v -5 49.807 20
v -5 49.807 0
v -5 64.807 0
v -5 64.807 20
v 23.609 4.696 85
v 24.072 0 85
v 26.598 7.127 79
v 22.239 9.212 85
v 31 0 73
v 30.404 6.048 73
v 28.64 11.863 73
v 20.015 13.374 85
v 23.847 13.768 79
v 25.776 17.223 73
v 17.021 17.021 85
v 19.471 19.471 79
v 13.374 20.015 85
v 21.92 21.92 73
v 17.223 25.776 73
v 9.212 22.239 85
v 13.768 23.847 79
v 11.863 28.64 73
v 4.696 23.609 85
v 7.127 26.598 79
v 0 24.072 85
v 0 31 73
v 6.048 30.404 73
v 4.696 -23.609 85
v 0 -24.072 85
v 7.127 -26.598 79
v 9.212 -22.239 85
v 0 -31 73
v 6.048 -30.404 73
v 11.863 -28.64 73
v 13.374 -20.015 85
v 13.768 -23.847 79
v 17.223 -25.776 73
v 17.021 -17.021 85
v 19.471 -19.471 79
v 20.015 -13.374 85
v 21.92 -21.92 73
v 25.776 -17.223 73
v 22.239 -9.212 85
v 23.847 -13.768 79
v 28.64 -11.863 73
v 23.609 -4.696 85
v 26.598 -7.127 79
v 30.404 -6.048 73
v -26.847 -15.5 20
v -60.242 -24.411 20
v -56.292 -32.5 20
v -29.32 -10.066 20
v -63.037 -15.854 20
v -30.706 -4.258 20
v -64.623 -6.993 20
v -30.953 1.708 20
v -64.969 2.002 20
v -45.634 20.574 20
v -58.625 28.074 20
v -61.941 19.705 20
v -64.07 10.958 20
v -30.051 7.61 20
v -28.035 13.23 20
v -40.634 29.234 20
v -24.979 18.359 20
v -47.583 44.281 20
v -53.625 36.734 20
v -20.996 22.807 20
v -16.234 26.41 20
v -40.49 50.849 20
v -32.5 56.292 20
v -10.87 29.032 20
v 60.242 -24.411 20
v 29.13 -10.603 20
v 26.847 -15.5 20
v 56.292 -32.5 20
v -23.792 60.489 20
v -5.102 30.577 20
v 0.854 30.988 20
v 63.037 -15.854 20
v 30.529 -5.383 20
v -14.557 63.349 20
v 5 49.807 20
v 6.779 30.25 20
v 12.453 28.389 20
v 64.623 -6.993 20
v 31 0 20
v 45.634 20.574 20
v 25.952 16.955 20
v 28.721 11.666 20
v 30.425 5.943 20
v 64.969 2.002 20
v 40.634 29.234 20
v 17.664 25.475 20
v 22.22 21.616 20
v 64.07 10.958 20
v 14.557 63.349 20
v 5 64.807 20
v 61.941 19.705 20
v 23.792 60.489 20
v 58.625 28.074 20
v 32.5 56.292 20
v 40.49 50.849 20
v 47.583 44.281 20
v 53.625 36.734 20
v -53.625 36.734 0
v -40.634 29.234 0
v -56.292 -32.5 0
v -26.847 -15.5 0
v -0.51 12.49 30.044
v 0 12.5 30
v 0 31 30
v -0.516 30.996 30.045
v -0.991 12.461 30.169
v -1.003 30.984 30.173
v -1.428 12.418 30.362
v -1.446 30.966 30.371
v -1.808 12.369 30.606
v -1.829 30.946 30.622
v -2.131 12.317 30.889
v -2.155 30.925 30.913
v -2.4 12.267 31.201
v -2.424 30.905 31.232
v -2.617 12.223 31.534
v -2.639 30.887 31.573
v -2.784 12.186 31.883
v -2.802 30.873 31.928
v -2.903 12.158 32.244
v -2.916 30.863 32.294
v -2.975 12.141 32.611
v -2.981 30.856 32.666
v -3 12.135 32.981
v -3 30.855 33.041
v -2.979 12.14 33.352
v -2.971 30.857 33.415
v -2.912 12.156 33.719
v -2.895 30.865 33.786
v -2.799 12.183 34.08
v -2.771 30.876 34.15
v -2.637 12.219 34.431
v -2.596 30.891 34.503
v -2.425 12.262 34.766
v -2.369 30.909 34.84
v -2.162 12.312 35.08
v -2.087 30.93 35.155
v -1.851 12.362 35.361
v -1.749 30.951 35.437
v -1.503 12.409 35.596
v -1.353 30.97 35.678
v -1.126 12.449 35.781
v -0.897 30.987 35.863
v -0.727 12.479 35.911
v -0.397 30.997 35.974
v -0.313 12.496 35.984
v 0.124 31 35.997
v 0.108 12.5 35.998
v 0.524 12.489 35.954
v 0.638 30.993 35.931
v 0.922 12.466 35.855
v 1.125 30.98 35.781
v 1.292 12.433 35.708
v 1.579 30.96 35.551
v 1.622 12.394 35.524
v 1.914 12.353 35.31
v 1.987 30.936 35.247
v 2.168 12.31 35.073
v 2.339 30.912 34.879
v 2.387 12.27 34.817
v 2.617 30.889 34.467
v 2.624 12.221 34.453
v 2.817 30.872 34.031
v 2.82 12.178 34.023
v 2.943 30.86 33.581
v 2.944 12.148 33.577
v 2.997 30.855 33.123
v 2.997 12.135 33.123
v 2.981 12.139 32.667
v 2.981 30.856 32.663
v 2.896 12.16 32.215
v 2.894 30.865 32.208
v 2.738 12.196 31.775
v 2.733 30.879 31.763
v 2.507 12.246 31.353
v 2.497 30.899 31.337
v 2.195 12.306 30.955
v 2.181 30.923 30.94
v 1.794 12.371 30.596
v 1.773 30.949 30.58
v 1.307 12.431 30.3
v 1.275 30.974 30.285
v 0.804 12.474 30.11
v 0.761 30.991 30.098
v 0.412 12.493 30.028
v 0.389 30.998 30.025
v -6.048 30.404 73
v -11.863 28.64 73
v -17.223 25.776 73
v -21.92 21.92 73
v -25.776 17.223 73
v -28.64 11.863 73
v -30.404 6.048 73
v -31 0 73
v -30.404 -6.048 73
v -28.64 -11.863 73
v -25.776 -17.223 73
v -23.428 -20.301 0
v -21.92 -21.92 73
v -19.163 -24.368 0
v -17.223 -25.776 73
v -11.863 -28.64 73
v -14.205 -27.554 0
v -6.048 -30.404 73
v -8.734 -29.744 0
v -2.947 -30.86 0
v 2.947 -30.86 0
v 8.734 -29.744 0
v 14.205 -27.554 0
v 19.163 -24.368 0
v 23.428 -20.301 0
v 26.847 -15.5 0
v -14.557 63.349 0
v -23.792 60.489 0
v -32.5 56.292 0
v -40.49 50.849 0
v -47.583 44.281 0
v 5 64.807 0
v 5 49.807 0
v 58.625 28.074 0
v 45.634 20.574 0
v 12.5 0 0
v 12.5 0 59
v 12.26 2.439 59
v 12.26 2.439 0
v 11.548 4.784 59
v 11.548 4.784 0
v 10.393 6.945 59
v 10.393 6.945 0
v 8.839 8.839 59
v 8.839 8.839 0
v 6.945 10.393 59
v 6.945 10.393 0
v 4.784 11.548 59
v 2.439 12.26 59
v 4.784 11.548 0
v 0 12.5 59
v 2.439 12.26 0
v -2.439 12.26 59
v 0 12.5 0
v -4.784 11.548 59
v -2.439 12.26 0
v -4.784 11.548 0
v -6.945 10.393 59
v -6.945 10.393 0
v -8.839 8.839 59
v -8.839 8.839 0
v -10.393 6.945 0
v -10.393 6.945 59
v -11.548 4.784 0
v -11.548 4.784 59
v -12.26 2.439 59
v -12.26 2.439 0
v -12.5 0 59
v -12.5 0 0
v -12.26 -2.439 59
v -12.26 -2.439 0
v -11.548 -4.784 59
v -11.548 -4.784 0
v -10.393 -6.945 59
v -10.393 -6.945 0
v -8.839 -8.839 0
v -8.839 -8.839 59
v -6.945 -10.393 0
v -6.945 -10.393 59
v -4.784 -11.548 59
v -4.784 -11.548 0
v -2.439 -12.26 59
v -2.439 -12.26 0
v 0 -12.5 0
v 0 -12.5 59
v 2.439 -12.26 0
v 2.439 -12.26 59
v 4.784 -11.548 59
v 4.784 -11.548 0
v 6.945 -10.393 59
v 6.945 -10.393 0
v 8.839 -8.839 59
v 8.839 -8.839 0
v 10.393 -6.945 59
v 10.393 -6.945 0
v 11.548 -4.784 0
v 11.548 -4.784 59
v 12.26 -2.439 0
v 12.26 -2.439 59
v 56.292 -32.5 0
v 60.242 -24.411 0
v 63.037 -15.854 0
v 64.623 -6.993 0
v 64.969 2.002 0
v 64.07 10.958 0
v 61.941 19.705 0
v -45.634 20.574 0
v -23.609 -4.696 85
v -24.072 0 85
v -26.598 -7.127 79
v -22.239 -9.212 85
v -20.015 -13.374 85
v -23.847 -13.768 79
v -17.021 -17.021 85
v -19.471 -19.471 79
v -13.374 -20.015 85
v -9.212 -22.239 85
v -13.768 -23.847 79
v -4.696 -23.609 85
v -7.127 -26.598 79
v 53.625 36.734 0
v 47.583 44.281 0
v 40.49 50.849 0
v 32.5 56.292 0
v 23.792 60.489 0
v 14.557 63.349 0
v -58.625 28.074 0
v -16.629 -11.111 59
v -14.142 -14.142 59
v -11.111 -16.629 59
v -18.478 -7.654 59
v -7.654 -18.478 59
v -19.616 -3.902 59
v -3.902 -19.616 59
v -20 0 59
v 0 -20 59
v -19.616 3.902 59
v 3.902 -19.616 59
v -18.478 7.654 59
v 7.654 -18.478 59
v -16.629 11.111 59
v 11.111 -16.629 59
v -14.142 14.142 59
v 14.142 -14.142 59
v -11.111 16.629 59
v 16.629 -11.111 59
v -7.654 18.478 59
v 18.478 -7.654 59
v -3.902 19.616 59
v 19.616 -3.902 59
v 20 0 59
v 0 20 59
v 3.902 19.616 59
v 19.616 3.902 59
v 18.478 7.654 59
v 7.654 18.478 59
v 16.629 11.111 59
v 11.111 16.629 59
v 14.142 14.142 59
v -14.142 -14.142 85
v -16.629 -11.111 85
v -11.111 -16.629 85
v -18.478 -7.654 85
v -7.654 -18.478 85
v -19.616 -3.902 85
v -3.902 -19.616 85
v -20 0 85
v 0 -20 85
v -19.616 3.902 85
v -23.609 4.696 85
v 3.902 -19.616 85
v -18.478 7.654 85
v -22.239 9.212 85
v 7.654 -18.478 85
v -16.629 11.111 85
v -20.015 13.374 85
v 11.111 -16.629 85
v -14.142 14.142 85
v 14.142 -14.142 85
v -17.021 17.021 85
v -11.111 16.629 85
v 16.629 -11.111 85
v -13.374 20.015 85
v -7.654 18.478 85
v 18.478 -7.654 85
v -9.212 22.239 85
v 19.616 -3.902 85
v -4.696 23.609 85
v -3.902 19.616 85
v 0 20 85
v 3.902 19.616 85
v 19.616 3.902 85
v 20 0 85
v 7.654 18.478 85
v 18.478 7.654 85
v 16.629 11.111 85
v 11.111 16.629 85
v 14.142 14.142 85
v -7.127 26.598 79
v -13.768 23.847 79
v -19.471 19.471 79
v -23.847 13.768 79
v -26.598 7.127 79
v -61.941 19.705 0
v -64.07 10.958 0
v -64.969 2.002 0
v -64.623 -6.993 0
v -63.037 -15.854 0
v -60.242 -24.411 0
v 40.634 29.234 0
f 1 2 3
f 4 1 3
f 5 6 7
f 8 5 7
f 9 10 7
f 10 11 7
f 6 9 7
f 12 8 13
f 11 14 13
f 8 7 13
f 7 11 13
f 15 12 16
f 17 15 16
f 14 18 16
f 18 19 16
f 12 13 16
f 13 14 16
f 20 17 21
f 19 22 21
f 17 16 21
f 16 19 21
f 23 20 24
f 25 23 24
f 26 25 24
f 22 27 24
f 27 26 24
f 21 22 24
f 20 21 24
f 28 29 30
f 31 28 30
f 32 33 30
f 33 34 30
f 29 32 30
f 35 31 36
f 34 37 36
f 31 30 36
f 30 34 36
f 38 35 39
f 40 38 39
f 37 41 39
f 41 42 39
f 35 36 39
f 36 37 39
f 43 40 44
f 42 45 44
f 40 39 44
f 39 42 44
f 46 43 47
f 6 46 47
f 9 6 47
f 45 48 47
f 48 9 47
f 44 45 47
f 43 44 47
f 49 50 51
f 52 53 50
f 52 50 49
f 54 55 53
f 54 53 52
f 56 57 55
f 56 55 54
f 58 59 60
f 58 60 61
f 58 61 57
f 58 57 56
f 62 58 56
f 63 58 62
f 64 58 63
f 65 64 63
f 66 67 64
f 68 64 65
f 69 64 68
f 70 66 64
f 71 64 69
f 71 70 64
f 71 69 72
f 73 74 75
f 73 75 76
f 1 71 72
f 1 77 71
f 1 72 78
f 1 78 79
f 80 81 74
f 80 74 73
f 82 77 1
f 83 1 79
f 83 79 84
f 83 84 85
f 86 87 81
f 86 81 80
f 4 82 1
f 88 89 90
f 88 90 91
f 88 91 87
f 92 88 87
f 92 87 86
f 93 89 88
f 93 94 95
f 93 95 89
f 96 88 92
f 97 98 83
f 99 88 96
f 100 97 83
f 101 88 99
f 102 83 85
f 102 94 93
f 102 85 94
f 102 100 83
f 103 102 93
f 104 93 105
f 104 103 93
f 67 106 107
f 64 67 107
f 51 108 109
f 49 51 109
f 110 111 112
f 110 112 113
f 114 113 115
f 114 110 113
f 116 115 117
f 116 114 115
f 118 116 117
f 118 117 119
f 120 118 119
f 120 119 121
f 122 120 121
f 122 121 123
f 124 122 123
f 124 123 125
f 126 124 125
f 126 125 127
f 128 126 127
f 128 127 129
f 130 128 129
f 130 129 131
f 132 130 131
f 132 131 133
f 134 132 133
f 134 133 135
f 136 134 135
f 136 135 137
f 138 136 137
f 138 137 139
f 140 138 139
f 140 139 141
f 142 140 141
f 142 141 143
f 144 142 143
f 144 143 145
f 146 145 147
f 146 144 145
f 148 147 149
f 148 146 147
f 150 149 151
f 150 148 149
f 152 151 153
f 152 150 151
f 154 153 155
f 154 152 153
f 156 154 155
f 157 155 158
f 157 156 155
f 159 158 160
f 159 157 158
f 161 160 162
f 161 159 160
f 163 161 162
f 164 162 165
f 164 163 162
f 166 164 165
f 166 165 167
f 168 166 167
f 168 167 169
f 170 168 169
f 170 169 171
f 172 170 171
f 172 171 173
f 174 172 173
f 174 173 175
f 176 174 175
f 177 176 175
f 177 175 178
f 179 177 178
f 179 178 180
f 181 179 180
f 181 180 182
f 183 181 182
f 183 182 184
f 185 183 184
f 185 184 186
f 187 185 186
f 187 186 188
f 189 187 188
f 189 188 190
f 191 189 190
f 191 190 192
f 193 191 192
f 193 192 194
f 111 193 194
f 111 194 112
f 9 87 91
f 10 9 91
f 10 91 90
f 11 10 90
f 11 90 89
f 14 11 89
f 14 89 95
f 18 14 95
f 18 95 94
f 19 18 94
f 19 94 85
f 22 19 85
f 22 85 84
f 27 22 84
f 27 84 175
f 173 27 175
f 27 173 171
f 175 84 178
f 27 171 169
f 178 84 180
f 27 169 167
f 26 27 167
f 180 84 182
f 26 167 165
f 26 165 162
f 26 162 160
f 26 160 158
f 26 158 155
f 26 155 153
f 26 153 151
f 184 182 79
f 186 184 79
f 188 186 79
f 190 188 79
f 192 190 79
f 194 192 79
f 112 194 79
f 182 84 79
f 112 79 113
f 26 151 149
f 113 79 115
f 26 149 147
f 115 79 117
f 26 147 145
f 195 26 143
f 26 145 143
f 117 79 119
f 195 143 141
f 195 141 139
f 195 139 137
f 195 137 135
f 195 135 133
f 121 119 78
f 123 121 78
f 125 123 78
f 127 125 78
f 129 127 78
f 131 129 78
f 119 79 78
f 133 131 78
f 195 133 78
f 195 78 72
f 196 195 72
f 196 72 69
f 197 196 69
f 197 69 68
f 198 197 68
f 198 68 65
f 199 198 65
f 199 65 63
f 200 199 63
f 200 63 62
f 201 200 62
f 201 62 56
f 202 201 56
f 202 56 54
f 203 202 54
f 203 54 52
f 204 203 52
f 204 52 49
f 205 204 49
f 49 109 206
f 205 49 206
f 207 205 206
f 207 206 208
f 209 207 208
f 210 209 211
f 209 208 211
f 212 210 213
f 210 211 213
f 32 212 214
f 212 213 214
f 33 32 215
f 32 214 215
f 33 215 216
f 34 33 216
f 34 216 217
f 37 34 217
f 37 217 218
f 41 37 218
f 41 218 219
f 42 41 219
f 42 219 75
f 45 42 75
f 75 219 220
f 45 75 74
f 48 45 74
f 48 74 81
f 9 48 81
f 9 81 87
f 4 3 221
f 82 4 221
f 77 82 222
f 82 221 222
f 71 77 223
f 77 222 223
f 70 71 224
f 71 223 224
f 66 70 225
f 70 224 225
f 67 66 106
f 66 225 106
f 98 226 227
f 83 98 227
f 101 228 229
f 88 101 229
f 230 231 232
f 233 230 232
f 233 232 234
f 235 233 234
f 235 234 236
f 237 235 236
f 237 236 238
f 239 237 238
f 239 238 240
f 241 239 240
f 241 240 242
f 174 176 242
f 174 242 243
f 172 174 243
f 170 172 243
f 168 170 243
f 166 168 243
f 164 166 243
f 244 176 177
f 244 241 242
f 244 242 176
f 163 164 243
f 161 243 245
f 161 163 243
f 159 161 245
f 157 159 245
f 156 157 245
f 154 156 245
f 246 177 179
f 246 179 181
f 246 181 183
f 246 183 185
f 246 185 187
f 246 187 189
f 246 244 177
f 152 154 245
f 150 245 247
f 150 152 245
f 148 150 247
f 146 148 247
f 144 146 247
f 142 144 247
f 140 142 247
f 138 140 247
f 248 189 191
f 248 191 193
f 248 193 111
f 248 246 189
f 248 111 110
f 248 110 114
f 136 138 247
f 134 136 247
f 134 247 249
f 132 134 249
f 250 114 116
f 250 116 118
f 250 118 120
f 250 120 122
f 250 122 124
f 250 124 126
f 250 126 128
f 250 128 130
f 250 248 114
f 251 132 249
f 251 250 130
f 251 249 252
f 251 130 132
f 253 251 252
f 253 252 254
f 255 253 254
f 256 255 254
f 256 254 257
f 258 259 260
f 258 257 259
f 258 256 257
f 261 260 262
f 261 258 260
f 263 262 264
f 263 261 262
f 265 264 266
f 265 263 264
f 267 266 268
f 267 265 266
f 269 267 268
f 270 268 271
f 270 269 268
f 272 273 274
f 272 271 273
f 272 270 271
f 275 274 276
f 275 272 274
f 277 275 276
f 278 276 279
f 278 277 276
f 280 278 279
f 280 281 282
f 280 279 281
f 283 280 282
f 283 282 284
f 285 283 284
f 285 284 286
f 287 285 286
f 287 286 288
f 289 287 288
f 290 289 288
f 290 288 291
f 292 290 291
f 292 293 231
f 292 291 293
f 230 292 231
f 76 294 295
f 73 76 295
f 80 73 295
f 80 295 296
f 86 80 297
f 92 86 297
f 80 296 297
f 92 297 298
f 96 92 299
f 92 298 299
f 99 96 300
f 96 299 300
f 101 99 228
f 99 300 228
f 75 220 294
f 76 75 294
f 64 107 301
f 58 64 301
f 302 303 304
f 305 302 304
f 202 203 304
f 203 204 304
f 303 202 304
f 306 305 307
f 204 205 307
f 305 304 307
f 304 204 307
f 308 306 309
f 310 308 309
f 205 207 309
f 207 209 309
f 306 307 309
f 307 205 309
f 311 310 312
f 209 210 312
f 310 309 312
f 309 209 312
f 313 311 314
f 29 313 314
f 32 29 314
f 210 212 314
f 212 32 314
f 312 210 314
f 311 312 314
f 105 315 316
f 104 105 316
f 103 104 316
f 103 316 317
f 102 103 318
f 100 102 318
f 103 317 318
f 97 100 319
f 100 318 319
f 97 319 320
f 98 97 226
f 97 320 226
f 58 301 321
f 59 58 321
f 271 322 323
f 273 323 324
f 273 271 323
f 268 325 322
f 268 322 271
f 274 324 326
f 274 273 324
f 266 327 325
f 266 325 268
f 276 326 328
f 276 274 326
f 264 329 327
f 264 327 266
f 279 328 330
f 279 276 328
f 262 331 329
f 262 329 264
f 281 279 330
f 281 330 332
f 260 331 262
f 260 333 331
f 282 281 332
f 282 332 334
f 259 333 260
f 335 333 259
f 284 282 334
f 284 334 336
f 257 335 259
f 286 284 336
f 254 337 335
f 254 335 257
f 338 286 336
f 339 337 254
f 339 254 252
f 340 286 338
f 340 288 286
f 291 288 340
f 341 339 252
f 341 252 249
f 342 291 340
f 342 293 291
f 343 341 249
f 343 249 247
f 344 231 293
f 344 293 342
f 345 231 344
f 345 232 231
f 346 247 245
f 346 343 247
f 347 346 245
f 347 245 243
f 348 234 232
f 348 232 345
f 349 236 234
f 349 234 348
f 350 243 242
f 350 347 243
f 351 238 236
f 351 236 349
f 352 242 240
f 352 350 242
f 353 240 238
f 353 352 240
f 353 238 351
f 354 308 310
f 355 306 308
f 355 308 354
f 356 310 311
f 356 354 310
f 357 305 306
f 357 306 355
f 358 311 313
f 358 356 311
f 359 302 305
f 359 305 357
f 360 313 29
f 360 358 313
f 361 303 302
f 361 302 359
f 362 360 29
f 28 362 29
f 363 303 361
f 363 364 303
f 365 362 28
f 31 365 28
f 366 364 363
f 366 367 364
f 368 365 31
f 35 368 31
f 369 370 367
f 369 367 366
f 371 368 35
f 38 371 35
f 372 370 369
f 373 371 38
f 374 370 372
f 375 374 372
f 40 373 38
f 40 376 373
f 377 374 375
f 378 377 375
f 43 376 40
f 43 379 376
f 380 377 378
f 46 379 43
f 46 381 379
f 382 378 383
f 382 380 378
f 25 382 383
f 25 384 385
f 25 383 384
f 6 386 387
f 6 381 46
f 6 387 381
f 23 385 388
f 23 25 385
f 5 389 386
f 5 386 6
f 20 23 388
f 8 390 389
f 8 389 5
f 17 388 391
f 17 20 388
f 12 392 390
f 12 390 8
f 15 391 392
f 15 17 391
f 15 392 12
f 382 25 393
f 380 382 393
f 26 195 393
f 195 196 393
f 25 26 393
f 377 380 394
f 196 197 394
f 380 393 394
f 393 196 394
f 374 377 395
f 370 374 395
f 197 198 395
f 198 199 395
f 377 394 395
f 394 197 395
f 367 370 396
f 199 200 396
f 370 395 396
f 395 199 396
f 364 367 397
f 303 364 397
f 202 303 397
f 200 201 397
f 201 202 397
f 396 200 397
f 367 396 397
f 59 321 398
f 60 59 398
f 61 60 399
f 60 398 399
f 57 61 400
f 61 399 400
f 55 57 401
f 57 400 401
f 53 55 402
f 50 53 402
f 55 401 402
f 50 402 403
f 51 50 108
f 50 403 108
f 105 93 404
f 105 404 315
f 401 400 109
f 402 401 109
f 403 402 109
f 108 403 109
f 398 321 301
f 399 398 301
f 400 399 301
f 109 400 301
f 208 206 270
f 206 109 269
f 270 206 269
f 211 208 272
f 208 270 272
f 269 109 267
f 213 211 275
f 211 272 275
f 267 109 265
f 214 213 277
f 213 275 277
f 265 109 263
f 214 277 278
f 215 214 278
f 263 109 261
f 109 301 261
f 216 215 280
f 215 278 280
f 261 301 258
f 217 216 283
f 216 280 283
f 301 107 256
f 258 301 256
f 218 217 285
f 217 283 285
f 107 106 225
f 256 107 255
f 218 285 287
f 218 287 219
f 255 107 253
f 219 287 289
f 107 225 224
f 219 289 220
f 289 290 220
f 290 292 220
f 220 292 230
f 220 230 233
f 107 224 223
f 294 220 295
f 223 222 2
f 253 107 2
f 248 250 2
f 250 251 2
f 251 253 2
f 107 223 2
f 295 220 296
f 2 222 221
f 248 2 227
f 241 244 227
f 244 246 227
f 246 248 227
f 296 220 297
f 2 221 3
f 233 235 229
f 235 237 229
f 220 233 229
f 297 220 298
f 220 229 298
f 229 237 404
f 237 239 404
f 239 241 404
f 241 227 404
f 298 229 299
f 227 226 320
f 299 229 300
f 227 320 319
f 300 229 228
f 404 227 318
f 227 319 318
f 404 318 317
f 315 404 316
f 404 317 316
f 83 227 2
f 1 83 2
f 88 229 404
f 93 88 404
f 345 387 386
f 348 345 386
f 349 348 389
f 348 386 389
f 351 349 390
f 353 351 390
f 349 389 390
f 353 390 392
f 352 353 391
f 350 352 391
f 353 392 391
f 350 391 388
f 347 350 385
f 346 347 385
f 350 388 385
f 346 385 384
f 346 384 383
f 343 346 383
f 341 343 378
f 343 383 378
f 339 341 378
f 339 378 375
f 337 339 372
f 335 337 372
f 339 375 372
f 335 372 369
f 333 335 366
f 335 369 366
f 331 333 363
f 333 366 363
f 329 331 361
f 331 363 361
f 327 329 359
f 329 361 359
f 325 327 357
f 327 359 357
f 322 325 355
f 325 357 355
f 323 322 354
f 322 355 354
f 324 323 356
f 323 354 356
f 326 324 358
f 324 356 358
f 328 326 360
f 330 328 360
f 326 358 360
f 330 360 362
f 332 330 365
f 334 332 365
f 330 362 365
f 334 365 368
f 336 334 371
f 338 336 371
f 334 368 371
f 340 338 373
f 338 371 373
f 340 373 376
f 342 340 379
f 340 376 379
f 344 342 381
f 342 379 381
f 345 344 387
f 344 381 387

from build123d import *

# Parameters (mm, degrees)
BOSS_EXTRUDE1_DEPTH      = 20
BOSS_EXTRUDE2_DEPTH      = 65
BOSS_EXTRUDE2_DEPTH_BACK = 20
SKETCH3_R                = 31
SKETCH3_R_2              = 12.5
SKETCH6_R                = 20
CUT_EXTRUDE1_DEPTH       = 26
SKETCH8_R                = 12.5
CUT_EXTRUDE2_DEPTH       = 20
SKETCH9_R                = 3
CUT_EXTRUDE3_DEPTH       = 33


with BuildPart() as part:
    # Sketch2 → Boss-Extrude1 (new body)
    with BuildSketch(Plane.XY):
        with BuildLine():
            Line((0, 0), (56.291651246, -32.5))
            ThreePointArc((56.291651246, -32.5), (64.9518339, -2.501853916), (58.624860802, 28.073576473))
            Line((58.624860802, 28.073576473), (45.634479745, 20.573576473))
            Line((45.634479745, 20.573576473), (40.634479745, 29.233830511))
            Line((40.634479745, 29.233830511), (53.624860802, 36.733830511))
            ThreePointArc((53.624860802, 36.733830511), (32.5, 56.291651246), (5, 64.807406984))
            Line((5, 64.807406984), (5, 49.807406984))
            Line((5, 49.807406984), (-5, 49.807406984))
            Line((-5, 49.807406984), (-5, 64.807406984))
            ThreePointArc((-5, 64.807406984), (-32.5, 56.291651246), (-53.624860802, 36.733830511))
            Line((-53.624860802, 36.733830511), (-40.634479745, 29.233830511))
            Line((-40.634479745, 29.233830511), (-45.634479745, 20.573576473))
            Line((-45.634479745, 20.573576473), (-58.624860802, 28.073576473))
            ThreePointArc((-58.624860802, 28.073576473), (-64.9518339, -2.501853916), (-56.291651246, -32.5))
            Line((-56.291651246, -32.5), (0, 0))
        make_face()
    extrude(amount=BOSS_EXTRUDE1_DEPTH)

    # Sketch3 → Boss-Extrude2 (add, two sides: drawn at the far end of the back side and taken through both)
    with BuildSketch(Plane.XY.offset(20).offset(-BOSS_EXTRUDE2_DEPTH_BACK)):
        Circle(SKETCH3_R)
        Circle(SKETCH3_R_2, mode=Mode.SUBTRACT)
    extrude(amount=BOSS_EXTRUDE2_DEPTH + BOSS_EXTRUDE2_DEPTH_BACK)

    # Cut-Sweep1: sweep along a curve in space
    with BuildLine() as cut_sweep1_path:
        ThreePointArc((31, 0, 85), (21.920310217, 21.920310217, 85), (0, 31, 85))
        ThreePointArc((0, 31, 85), (-21.920310217, 21.920310217, 85), (-31, 0, 85))
        ThreePointArc((-31, 0, 85), (-21.920310217, -21.920310217, 85), (0, -31, 85))
        ThreePointArc((0, -31, 85), (21.920310217, -21.920310217, 85), (31, 0, 85))
    # Sketch5 → Cut-Sweep1 (sweep, cut)
    with BuildSketch(Plane(origin=(0, 0, 0), x_dir=(0, 0, -1), z_dir=(1, 0, 0))):
        Polygon((-85, 31), (-73, 31), (-85, 24.07179677), align=None)
    sweep(path=cut_sweep1_path.line, mode=Mode.SUBTRACT)

    # Sketch6 → Cut-Extrude1 (cut)
    with BuildSketch(Plane.XY.offset(85)):
        Circle(SKETCH6_R)
    extrude(amount=-CUT_EXTRUDE1_DEPTH, mode=Mode.SUBTRACT)

    # Sketch8 → Cut-Extrude2 (cut)
    with BuildSketch(Plane.XY.offset(20)):
        Circle(SKETCH8_R)
    extrude(amount=-CUT_EXTRUDE2_DEPTH, mode=Mode.SUBTRACT)

    # Sketch9 → Cut-Extrude3 (cut)
    with BuildSketch(Plane(origin=(0, 0, 0), x_dir=(1, 0, 0), z_dir=(0, 1, 0))):
        with Locations(Location((0, -33, 0), (0, 0, 90))):
            Circle(SKETCH9_R)
    extrude(amount=CUT_EXTRUDE3_DEPTH, mode=Mode.SUBTRACT)


solid = part.part
